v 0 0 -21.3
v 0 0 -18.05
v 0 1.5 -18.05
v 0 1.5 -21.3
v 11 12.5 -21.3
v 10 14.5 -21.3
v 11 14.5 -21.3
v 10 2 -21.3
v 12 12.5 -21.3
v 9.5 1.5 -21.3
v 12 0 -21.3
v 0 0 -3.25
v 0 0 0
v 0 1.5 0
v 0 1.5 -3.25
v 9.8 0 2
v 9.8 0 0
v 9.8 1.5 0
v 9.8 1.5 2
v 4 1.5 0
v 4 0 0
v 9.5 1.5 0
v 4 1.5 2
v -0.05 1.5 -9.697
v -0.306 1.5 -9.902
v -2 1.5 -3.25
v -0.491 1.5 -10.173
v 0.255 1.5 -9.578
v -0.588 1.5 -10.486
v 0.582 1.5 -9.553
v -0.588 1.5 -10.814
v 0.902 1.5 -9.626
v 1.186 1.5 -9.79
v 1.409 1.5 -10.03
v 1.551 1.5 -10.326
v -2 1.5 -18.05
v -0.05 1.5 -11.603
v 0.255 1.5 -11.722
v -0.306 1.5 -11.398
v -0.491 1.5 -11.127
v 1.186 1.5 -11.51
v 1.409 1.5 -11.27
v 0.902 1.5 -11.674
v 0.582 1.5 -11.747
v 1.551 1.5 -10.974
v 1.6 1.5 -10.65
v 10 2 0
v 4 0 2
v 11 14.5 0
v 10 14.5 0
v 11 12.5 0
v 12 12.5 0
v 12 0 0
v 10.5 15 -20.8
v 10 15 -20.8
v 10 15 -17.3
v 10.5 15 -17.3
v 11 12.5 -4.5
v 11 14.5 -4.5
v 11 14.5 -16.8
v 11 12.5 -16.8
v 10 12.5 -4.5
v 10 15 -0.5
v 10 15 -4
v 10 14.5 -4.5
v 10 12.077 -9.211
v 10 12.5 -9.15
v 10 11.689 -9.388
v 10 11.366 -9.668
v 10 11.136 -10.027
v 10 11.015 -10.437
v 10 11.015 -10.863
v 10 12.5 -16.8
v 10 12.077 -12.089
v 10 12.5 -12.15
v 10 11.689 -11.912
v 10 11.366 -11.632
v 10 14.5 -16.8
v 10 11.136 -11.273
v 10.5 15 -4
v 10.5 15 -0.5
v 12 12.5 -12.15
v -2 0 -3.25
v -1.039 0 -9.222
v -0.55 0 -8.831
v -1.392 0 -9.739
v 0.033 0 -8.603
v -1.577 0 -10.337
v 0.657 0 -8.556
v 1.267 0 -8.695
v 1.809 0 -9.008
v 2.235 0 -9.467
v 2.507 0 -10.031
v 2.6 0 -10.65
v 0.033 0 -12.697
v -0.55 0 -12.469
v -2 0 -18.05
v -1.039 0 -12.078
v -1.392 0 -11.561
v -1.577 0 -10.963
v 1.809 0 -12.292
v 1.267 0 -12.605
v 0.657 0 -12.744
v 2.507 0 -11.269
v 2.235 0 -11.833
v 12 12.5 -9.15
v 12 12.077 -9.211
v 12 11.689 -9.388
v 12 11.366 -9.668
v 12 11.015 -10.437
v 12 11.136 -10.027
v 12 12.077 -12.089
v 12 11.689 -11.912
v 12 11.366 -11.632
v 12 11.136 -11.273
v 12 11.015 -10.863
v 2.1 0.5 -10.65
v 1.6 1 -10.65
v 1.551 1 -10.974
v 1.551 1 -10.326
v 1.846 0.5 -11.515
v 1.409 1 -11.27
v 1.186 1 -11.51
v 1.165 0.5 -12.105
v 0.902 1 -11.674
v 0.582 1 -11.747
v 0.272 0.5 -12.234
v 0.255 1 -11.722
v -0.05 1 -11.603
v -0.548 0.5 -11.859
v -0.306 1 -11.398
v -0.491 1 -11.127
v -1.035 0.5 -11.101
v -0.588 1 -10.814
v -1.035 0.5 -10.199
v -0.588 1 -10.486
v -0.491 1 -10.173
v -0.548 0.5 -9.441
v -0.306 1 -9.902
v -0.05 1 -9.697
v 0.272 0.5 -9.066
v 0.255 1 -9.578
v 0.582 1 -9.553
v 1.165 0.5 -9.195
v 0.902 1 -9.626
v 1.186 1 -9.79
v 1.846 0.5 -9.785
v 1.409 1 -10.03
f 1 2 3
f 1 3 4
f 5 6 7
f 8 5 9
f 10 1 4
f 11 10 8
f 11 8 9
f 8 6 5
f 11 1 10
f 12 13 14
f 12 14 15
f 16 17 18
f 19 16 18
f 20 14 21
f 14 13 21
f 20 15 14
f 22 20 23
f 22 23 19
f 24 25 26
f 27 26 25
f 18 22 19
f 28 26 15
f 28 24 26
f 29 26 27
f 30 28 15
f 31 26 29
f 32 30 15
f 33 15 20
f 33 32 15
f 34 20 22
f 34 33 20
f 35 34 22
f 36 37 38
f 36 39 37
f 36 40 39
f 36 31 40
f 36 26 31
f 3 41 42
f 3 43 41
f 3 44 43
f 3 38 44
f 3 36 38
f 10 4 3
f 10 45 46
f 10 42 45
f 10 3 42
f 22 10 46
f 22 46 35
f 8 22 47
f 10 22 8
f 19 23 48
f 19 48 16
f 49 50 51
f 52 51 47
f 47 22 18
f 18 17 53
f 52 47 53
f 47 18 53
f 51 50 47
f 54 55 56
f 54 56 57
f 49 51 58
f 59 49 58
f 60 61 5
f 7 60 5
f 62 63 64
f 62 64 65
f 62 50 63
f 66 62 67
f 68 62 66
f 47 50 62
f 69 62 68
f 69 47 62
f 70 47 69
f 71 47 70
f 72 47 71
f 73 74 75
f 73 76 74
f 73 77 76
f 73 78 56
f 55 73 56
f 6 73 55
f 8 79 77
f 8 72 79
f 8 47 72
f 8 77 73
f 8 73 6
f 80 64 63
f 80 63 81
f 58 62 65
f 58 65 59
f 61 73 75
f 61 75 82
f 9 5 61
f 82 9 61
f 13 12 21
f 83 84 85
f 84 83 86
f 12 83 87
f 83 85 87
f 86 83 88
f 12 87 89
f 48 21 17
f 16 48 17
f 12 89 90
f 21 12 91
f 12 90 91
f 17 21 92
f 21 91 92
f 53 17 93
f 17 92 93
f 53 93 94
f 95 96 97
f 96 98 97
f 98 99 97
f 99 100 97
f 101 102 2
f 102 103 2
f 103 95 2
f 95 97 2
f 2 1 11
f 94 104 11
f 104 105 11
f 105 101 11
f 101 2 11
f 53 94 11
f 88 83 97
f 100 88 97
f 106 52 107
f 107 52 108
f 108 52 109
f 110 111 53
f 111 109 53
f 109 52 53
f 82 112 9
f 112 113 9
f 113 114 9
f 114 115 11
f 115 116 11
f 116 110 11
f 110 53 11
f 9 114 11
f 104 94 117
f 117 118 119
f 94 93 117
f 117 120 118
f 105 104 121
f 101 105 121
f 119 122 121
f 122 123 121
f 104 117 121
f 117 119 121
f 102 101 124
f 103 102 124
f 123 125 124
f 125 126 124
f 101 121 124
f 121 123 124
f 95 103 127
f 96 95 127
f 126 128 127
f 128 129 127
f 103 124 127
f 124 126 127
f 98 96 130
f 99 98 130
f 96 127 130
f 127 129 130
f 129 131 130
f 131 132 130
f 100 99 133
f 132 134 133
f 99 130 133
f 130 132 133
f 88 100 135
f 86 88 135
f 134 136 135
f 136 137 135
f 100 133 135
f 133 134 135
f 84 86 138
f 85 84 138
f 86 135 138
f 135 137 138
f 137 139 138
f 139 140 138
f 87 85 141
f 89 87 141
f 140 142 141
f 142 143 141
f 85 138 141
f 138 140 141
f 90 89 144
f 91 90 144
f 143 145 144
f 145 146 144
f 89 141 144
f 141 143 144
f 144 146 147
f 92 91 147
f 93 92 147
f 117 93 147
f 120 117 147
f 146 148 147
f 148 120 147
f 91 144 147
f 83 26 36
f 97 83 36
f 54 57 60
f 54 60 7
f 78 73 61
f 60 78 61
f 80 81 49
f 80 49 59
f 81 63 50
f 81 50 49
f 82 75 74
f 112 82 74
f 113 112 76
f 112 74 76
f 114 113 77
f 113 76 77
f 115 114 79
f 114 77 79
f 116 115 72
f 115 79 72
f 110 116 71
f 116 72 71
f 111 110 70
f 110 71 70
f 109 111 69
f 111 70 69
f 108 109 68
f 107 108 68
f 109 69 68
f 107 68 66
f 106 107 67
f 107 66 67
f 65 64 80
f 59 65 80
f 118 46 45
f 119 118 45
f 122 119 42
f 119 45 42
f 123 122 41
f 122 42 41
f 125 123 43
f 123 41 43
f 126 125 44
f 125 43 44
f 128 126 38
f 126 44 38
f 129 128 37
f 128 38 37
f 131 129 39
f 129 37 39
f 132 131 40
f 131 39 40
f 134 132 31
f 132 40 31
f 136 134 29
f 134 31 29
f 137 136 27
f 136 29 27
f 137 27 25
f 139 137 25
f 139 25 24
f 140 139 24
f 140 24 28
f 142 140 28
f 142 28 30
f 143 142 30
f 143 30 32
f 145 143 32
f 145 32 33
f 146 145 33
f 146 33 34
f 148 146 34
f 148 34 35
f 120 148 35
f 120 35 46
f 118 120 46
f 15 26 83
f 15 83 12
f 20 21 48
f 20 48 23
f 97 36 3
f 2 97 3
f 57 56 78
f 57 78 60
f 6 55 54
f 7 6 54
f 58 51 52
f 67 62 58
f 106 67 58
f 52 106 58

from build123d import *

# Parameters (mm, degrees)
SKETCH1_W           = 12
SKETCH1_H           = 21.3
BOSS_EXTRUDE1_DEPTH = 1.5
SKETCH2_W           = 2
SKETCH2_H           = 21.3
BOSS_EXTRUDE2_DEPTH = 11
SKETCH3_W           = 2
SKETCH3_H           = 14.8
BOSS_EXTRUDE3_DEPTH = 1.5
SKETCH4_R           = 1.5
CUT_EXTRUDE1_DEPTH  = 2
CHAMFER1_SIZE       = 0.5
CUT_EXTRUDE2_REACH  = 3.5
SKETCH5_R           = 1.1
CHAMFER2_SIZE       = 1
SKETCH6_W           = 1
SKETCH6_H           = 4.5
BOSS_EXTRUDE4_DEPTH = 2.5
CHAMFER3_SIZE       = 0.5
SKETCH7_W           = 5.8
SKETCH7_H           = 1.5
BOSS_EXTRUDE5_DEPTH = 2


with BuildPart() as part:
    # Sketch1 → Boss-Extrude1 (new body)
    with BuildSketch(Plane(origin=(0, 0, 0), x_dir=(1, 0, 0), z_dir=(0, 1, 0))):
        with Locations((6, 10.65)):
            Rectangle(SKETCH1_W, SKETCH1_H)
    extrude(amount=BOSS_EXTRUDE1_DEPTH)

    # Sketch2 → Boss-Extrude2 (add)
    with BuildSketch(Plane(origin=(0, 1.5, 0), x_dir=(1, 0, 0), z_dir=(0, 1, 0))):
        with Locations((11, 10.65)):
            Rectangle(SKETCH2_W, SKETCH2_H)
    extrude(amount=BOSS_EXTRUDE2_DEPTH)

    # Sketch3 → Boss-Extrude3 (add)
    with BuildSketch(Plane(origin=(0, 1.5, 0), x_dir=(1, 0, 0), z_dir=(0, 1, 0))):
        with Locations((-1, 10.65)):
            Rectangle(SKETCH3_W, SKETCH3_H)
    extrude(amount=-BOSS_EXTRUDE3_DEPTH)

    # Sketch4 → Cut-Extrude1 (cut)
    with BuildSketch(Plane.ZY.offset(-10)):
        with Locations((-10.65, 12.5)):
            Circle(SKETCH4_R)
    extrude(amount=-CUT_EXTRUDE1_DEPTH, mode=Mode.SUBTRACT)

    # Chamfer1
    chamfer1_edges = [part.edges().sort_by_distance(p)[0] for p in [
        (10, 1.5, -10.65),
    ]]
    chamfer(chamfer1_edges, length=CHAMFER1_SIZE)

    # Sketch5 → Cut-Extrude2 (cut, up to next)
    with BuildSketch(Plane(origin=(0, 1.5, 0), x_dir=(1, 0, 0), z_dir=(0, 1, 0)), mode=Mode.PRIVATE) as cut_extrude2_sk1:
        with Locations((0.5, 10.65)):
            Circle(SKETCH5_R)
    cut_extrude2_tool1 = extrude(cut_extrude2_sk1.sketch, amount=-CUT_EXTRUDE2_REACH, mode=Mode.PRIVATE) & part.part
    add(cut_extrude2_tool1.solids().sort_by_distance((0.5, 1.5, -10.65))[0], mode=Mode.SUBTRACT)

    # Chamfer2
    chamfer2_edges = [part.edges().sort_by_distance(p)[0] for p in [
        (-0.6, 0, -10.65),
    ]]
    chamfer(chamfer2_edges, length=CHAMFER2_SIZE)

    # Sketch6 → Boss-Extrude4 (add)
    with BuildSketch(Plane(origin=(0, 12.5, 0), x_dir=(1, 0, 0), z_dir=(0, 1, 0))):
        with Locations((10.5, 2.25)):
            Rectangle(SKETCH6_W, SKETCH6_H)
        with Locations((10.5, 19.05)):
            Rectangle(SKETCH6_W, SKETCH6_H)
    extrude(amount=BOSS_EXTRUDE4_DEPTH)

    # Chamfer3
    chamfer3_edges = [part.edges().sort_by_distance(p)[0] for p in [
        (10.5, 15, -21.3),
        (11, 15, -19.05),
        (10.5, 15, -16.8),
        (10.5, 15, -4.5),
        (11, 15, -2.25),
        (10.5, 15, 0),
    ]]
    chamfer(chamfer3_edges, length=CHAMFER3_SIZE)

    # Sketch7 → Boss-Extrude5 (add)
    with BuildSketch(Plane.XY):
        with Locations((6.9, 0.75)):
            Rectangle(SKETCH7_W, SKETCH7_H)
    extrude(amount=BOSS_EXTRUDE5_DEPTH)


solid = part.part
